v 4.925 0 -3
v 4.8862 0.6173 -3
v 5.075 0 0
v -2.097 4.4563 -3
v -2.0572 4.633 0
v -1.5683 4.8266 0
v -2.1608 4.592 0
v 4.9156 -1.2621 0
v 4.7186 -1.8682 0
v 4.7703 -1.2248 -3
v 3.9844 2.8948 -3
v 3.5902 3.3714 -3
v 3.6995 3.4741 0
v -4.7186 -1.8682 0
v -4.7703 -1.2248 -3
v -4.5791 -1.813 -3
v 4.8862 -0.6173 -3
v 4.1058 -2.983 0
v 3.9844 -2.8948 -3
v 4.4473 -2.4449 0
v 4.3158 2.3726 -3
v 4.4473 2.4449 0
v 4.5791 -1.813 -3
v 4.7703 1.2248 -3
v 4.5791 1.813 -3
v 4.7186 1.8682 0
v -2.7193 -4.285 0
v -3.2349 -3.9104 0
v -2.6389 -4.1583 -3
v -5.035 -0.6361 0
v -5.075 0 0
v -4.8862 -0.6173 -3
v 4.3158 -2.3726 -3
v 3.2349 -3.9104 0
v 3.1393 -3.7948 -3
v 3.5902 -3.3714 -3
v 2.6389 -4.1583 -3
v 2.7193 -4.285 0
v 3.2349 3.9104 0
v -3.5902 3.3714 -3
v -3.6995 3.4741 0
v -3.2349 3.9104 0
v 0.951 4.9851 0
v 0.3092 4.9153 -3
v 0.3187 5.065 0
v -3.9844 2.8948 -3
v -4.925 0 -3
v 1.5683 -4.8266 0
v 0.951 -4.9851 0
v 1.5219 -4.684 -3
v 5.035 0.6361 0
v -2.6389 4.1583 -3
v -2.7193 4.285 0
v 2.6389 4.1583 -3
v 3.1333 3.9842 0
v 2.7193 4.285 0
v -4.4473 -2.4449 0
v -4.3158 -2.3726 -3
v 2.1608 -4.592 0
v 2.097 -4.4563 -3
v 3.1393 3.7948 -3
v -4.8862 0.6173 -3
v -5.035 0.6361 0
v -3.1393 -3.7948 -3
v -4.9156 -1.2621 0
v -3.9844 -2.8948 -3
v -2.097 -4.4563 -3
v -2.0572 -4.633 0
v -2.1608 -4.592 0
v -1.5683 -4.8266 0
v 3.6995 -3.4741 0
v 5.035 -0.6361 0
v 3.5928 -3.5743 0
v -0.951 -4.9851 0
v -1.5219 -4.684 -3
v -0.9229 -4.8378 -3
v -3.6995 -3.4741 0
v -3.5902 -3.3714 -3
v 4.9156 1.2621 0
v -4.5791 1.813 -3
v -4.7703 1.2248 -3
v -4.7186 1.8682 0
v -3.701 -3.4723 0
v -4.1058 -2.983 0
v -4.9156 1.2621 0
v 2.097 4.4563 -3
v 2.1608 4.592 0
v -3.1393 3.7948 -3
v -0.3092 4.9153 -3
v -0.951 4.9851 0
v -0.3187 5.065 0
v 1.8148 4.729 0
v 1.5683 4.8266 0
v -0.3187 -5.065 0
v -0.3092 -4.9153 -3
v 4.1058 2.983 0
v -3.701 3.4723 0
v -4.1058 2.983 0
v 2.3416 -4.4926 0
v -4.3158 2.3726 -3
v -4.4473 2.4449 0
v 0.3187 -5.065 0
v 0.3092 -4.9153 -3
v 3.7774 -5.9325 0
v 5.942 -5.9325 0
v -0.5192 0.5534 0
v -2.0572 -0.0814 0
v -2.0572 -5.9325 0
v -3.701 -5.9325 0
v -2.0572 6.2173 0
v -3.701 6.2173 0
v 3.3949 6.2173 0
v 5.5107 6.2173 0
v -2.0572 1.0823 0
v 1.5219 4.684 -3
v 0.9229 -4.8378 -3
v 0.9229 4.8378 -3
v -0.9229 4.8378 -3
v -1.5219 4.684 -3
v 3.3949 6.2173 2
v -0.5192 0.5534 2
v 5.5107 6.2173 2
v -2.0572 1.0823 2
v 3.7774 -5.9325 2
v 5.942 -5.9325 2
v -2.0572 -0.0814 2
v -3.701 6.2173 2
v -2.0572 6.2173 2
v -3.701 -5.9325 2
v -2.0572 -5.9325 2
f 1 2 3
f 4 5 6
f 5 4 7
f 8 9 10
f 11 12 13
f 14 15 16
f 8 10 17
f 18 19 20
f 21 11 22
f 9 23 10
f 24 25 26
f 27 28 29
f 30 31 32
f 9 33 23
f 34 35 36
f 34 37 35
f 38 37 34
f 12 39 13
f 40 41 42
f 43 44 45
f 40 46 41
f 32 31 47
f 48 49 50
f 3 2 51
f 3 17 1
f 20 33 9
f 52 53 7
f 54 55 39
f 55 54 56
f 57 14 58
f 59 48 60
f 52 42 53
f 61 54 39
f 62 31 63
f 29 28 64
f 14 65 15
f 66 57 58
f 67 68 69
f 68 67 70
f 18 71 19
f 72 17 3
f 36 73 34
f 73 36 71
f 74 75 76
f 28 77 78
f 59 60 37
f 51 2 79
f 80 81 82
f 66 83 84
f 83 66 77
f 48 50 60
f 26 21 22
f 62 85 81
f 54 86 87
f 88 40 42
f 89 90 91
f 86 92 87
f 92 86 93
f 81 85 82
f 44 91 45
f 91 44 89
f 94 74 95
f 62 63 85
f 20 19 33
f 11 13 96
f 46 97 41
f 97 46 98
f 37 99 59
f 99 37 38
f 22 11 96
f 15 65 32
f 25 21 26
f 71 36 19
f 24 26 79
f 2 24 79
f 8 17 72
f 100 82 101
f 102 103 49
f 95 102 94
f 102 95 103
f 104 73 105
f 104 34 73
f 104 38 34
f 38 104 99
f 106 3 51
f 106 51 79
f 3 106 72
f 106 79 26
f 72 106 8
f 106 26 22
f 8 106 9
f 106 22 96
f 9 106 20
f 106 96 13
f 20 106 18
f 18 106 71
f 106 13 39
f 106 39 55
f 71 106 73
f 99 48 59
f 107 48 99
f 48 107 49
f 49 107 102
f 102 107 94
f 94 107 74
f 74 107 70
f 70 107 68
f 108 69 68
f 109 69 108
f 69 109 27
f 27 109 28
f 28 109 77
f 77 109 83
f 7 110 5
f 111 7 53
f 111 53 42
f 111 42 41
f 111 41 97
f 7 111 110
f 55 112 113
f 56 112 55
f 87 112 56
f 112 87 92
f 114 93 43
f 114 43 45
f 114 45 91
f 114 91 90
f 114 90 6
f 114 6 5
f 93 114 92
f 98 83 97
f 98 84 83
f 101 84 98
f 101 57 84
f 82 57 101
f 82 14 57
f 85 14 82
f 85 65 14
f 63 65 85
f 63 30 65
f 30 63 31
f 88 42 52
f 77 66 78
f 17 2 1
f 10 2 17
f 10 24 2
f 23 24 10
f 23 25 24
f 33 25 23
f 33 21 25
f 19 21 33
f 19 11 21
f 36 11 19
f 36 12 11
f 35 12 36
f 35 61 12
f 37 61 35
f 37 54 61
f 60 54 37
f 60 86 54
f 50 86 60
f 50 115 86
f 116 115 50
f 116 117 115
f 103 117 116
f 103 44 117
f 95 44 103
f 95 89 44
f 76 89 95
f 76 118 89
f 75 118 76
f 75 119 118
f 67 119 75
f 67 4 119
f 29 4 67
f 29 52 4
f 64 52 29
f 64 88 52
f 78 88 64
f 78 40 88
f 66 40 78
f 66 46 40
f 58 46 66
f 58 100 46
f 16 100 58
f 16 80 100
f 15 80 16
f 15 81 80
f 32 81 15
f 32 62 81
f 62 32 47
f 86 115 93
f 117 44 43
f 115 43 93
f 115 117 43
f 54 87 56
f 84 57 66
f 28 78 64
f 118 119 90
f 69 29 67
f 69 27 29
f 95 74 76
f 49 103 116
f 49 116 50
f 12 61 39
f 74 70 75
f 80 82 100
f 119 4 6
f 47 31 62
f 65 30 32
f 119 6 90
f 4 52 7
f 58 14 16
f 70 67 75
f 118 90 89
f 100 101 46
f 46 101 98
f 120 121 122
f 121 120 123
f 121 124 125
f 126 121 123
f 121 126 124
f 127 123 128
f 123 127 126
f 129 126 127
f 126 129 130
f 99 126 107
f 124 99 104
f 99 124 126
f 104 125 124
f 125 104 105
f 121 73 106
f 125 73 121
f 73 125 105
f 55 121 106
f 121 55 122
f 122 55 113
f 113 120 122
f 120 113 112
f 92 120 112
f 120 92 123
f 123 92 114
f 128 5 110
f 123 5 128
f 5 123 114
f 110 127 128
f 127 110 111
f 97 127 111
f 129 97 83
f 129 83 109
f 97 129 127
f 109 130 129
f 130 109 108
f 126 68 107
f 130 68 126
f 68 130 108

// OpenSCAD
$fn = 50;

difference() {
	union() {
		translate(v = [0, 0, -3.0]) {
			cylinder(h = 3, r1 = 4.925, r2 = 5.075);
		}
		linear_extrude(height = 2) {
			text(font = "Impact", halign = "center", size = 12, text = "K", valign = "center");
		}
	}
	union();
}
